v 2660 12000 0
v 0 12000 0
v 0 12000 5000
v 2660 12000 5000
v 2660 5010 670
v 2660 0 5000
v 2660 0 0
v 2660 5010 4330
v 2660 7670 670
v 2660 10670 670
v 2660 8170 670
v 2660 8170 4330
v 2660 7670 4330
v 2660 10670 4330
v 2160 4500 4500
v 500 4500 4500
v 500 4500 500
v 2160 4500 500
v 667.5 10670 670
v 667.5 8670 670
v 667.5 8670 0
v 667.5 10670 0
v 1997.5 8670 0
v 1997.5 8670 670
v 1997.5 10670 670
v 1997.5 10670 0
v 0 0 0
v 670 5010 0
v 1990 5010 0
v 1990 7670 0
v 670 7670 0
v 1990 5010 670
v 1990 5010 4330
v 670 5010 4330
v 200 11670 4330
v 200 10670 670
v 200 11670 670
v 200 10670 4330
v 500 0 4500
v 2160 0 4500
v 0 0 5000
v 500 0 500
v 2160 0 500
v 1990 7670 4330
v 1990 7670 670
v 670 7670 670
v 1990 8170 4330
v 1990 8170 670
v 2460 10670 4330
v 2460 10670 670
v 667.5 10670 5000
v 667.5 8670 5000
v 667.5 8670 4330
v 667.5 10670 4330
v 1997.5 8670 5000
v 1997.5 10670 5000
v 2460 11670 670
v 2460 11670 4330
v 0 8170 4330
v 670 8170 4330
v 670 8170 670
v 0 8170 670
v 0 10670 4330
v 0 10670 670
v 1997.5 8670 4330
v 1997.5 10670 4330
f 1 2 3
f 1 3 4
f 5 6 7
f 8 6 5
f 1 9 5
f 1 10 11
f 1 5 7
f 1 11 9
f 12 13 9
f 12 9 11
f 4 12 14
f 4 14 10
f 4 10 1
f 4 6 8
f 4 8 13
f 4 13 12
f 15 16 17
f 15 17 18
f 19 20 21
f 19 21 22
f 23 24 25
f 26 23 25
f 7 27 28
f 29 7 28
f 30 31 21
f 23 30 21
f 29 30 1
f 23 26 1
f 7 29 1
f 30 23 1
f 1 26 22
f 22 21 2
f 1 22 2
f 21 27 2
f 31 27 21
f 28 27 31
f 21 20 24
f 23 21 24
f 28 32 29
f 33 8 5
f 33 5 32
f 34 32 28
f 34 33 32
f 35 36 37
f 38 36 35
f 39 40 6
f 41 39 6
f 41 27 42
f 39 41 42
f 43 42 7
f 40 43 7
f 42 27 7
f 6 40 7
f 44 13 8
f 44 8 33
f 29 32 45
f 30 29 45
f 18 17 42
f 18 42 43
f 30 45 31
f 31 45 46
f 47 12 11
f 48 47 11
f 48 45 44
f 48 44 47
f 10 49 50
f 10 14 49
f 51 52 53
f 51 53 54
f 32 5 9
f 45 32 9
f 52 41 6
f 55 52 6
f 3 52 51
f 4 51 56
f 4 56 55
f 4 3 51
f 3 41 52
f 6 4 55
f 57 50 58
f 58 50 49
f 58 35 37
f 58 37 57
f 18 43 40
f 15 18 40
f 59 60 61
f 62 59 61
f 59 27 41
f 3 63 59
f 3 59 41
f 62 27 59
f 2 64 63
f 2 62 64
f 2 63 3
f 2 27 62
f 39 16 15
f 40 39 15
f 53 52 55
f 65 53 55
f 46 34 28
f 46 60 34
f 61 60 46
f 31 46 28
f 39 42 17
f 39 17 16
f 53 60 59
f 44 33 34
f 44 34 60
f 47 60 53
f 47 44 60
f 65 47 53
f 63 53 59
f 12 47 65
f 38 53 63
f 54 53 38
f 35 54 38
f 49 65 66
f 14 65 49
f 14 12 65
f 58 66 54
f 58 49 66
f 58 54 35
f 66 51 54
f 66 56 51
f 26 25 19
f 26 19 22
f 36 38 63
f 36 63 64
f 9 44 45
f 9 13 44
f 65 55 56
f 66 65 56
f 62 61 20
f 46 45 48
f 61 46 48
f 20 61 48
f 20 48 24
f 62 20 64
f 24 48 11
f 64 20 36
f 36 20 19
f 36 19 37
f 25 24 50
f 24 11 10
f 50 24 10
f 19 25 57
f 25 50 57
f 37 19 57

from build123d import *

# Parameters (mm, degrees)
SKETCH2_W               = 2660
SKETCH2_H               = 12000
BOSS_EXTRUDE1_DEPTH     = 5000
SKETCH3_W               = 1330
SKETCH3_H               = 2000
CUT_EXTRUDE1_DEPTH      = 5000
SKETCH4_W               = 3660
SKETCH4_H               = 2500
CUT_EXTRUDE2_DEPTH      = 13270.34813772
SKETCH6_W               = 1320
SKETCH6_H               = 3660
CUT_EXTRUDE3_DEPTH      = 2660
CUT_EXTRUDE6_DEPTH      = 13270.34813772
CUT_EXTRUDE6_DEPTH_BACK = 4269
SKETCH7_W               = 1322.5
SKETCH7_H               = 2660
SKETCH8_W               = 1322.5
SKETCH8_H               = 500
CUT_EXTRUDE7_DEPTH      = 61
SKETCH11_W              = 4269
SKETCH11_H              = 2660
BOSS_EXTRUDE2_DEPTH     = 2.5
SKETCH12_W              = 61
SKETCH12_H              = 500
BOSS_EXTRUDE3_DEPTH     = 2.5
SKETCH13_W              = 3671.651451329
SKETCH13_H              = 2660
CUT_EXTRUDE8_DEPTH      = 670
SKETCH14_W              = 670
SKETCH14_H              = 2660
BOSS_EXTRUDE4_DEPTH     = 11.651451
SKETCH16_W              = 2260
SKETCH16_H              = 3660
CUT_EXTRUDE9_DEPTH      = 1000
SKETCH17_W              = 1660
SKETCH17_H              = 4000
CUT_EXTRUDE10_DEPTH     = 4500


with BuildPart() as part:
    # Sketch2 → Boss-Extrude1 (new body)
    with BuildSketch(Plane.XY):
        with Locations((1330, 6000)):
            Rectangle(SKETCH2_W, SKETCH2_H)
    extrude(amount=BOSS_EXTRUDE1_DEPTH)

    # Sketch3 → Cut-Extrude1 (cut)
    with BuildSketch(Plane.XY.offset(5000)):
        with Locations((1332.5, 9670)):
            Rectangle(SKETCH3_W, SKETCH3_H)
    extrude(amount=-CUT_EXTRUDE1_DEPTH, mode=Mode.SUBTRACT)

    # Sketch4 → Cut-Extrude2 (cut, through all)
    with BuildSketch(Plane(origin=(2660, 0, 0), x_dir=(0, 0, -1), z_dir=(1, 0, 0))):
        with Locations((-2500, 9420)):
            Rectangle(SKETCH4_W, SKETCH4_H)
    extrude(amount=-CUT_EXTRUDE2_DEPTH, mode=Mode.SUBTRACT)

    # Sketch6 → Cut-Extrude3 (cut)
    with BuildSketch(Plane(origin=(0, 8170, 0), x_dir=(1, 0, 0), z_dir=(0, 1, 0))):
        with Locations((1330, -2500)):
            Rectangle(SKETCH6_W, SKETCH6_H)
    extrude(amount=-CUT_EXTRUDE3_DEPTH, mode=Mode.SUBTRACT)

    # Sketch7 → Cut-Extrude6 (cut, two sides: drawn at the far end of the back side and taken through both)
    with BuildSketch(Plane(origin=(0, 0, 0), x_dir=(-1, 0, 0), z_dir=(0, 0, -1)).offset(-CUT_EXTRUDE6_DEPTH_BACK)):
        with Locations((-1328.75, 6340)):
            Rectangle(SKETCH7_W, SKETCH7_H)
    extrude(amount=CUT_EXTRUDE6_DEPTH + CUT_EXTRUDE6_DEPTH_BACK, mode=Mode.SUBTRACT)

    # Sketch8 → Cut-Extrude7 (cut)
    with BuildSketch(Plane(origin=(0, 0, 4269), x_dir=(-1, 0, 0), z_dir=(0, 0, -1))):
        with Locations((-1328.75, 5260)):
            Rectangle(SKETCH8_W, SKETCH8_H)
    extrude(amount=-CUT_EXTRUDE7_DEPTH, mode=Mode.SUBTRACT)

    # Sketch11 → Boss-Extrude2 (add)
    with BuildSketch(Plane(origin=(667.5, 0, 0), x_dir=(0, 0, -1), z_dir=(1, 0, 0))):
        with Locations((-2134.5, 6340)):
            Rectangle(SKETCH11_W, SKETCH11_H)
    extrude(amount=BOSS_EXTRUDE2_DEPTH)

    # Sketch12 → Boss-Extrude3 (add)
    with BuildSketch(Plane(origin=(667.5, 0, 0), x_dir=(0, 0, -1), z_dir=(1, 0, 0))):
        with Locations((-4299.5, 5260)):
            Rectangle(SKETCH12_W, SKETCH12_H)
    extrude(amount=BOSS_EXTRUDE3_DEPTH)

    # Sketch13 → Cut-Extrude8 (cut)
    with BuildSketch(Plane(origin=(2660, 0, 0), x_dir=(0, 0, -1), z_dir=(1, 0, 0))):
        with Locations((-2505.825725665, 6340)):
            Rectangle(SKETCH13_W, SKETCH13_H)
    extrude(amount=-CUT_EXTRUDE8_DEPTH, mode=Mode.SUBTRACT)

    # Sketch14 → Boss-Extrude4 (add)
    with BuildSketch(Plane(origin=(0, 0, 4341.651451329), x_dir=(-1, 0, 0), z_dir=(0, 0, -1))):
        with Locations((-2325, 6340)):
            Rectangle(SKETCH14_W, SKETCH14_H)
    extrude(amount=BOSS_EXTRUDE4_DEPTH)

    # Sketch16 → Cut-Extrude9 (cut)
    with BuildSketch(Plane.XZ.offset(-10670)):
        with Locations((1330, 2500)):
            Rectangle(SKETCH16_W, SKETCH16_H)
    extrude(amount=-CUT_EXTRUDE9_DEPTH, mode=Mode.SUBTRACT)

    # Sketch17 → Cut-Extrude10 (cut)
    with BuildSketch(Plane.XZ):
        with Locations((1330, 2500)):
            Rectangle(SKETCH17_W, SKETCH17_H)
    extrude(amount=-CUT_EXTRUDE10_DEPTH, mode=Mode.SUBTRACT)


solid = part.part
